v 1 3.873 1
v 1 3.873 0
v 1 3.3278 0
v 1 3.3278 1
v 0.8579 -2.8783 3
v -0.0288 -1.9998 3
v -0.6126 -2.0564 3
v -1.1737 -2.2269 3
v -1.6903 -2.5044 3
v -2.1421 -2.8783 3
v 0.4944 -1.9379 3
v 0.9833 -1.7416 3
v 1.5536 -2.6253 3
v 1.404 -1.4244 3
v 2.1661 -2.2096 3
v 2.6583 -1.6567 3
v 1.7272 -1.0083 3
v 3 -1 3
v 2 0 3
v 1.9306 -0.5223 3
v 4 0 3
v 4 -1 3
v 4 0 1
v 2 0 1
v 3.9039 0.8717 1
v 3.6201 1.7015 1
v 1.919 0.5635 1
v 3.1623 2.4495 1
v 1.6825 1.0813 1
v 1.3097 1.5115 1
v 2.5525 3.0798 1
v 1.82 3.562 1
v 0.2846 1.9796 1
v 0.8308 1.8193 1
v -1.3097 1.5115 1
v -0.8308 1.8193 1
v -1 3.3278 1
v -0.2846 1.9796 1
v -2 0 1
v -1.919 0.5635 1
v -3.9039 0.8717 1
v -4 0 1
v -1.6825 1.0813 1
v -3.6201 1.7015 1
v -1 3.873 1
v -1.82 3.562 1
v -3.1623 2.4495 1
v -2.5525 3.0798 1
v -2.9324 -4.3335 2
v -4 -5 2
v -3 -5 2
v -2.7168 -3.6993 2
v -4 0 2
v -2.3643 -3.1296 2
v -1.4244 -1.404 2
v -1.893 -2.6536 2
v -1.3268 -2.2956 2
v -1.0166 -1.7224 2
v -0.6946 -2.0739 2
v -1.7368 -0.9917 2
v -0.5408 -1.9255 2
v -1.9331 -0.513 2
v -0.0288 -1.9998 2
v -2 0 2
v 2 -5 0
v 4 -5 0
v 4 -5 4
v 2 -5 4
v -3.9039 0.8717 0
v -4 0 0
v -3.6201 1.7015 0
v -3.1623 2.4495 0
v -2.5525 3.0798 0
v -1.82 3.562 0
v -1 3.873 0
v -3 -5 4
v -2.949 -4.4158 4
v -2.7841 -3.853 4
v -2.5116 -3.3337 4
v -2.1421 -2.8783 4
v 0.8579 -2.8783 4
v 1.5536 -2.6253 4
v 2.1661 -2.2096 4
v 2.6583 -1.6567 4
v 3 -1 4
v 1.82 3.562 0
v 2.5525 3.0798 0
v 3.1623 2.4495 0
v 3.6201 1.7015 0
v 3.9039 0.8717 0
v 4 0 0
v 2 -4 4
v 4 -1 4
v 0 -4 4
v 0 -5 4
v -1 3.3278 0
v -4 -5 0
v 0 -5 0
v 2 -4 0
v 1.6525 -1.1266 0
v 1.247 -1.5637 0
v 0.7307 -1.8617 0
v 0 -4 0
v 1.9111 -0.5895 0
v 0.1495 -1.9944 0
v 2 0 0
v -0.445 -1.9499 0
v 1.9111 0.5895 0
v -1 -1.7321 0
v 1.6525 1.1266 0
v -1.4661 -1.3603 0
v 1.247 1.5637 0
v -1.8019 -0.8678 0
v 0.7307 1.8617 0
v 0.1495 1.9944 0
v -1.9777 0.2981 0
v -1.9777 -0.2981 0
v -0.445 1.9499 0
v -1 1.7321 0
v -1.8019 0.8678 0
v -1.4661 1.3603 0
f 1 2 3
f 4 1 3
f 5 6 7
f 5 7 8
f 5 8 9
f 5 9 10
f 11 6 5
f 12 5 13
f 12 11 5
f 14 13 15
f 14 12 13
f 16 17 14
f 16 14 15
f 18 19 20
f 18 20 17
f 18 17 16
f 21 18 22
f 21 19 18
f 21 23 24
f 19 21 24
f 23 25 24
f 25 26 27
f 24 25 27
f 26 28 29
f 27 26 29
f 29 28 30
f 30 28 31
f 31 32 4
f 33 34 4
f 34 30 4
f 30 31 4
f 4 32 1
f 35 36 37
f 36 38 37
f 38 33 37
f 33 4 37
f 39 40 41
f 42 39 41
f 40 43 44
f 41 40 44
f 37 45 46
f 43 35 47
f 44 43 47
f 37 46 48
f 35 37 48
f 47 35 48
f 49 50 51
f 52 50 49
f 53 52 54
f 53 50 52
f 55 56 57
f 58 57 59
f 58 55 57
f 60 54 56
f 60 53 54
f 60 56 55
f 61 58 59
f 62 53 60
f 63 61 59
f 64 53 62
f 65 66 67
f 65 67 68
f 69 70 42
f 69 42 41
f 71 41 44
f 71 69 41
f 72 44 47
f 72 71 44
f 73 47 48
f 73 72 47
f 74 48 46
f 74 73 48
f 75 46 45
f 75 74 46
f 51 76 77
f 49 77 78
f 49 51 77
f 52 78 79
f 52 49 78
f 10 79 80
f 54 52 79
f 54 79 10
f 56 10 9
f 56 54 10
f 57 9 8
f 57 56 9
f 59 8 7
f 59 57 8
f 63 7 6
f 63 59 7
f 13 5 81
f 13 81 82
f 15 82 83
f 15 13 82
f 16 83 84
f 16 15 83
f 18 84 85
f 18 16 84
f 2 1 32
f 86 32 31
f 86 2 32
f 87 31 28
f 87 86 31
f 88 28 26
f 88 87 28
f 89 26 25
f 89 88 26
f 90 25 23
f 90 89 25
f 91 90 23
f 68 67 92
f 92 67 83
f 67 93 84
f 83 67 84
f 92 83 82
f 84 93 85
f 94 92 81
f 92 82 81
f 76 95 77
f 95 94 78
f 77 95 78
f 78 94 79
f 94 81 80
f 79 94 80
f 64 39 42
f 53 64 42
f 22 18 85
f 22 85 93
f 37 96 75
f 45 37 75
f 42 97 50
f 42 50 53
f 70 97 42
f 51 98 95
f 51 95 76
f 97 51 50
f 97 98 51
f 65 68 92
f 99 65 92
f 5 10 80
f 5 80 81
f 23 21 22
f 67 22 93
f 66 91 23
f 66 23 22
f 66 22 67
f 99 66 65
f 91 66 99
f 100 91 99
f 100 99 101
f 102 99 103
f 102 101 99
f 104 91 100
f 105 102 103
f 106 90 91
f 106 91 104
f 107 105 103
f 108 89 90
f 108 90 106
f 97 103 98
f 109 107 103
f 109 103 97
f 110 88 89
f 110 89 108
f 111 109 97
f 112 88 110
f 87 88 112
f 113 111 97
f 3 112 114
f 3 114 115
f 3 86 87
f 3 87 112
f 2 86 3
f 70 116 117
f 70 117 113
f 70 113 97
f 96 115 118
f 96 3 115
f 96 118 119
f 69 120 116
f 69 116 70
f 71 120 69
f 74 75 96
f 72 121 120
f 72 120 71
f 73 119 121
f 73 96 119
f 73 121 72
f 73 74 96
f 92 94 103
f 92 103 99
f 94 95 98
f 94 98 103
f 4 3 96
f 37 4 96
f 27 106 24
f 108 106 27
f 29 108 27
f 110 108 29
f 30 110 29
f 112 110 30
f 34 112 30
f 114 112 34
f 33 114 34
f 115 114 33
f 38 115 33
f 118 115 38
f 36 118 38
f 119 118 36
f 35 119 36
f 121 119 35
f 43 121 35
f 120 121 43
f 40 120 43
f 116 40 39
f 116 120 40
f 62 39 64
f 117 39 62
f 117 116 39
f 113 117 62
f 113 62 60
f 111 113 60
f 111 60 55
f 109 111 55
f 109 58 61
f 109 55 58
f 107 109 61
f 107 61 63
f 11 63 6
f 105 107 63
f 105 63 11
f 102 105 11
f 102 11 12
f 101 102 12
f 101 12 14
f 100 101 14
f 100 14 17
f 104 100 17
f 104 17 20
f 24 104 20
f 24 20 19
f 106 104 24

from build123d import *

# Parameters (mm, degrees)
SKETCH1_R           = 2
BOSS_EXTRUDE1_DEPTH = 4
SKETCH2_W           = 2
SKETCH2_H           = 1
CUT_EXTRUDE1_DEPTH  = 4
CUT_EXTRUDE2_START  = -4
CUT_EXTRUDE2_DEPTH  = 4
CUT_EXTRUDE3_START  = -3
CUT_EXTRUDE3_DEPTH  = 3
CUT_EXTRUDE4_START  = -2
CUT_EXTRUDE4_DEPTH  = 2
CUT_EXTRUDE5_START  = -1
CUT_EXTRUDE5_DEPTH  = 1


# Read off the part's stored shape, not the designer's step: Cut-Extrude4
with BuildPart() as part:
    # Sketch1 → Boss-Extrude1 (new body)
    with BuildSketch(Plane.XY):
        with BuildLine():
            Line((4, -5), (-4, -5))
            Line((-4, -5), (-4, 0))
            ThreePointArc((-4, 0), (0, 4), (4, 0))
            Line((4, 0), (4, -5))
        make_face()
        Circle(SKETCH1_R, mode=Mode.SUBTRACT)
    extrude(amount=BOSS_EXTRUDE1_DEPTH)

    # Sketch2 → Cut-Extrude1 (cut)
    with BuildSketch(Plane.XY.offset(4)):
        with Locations((1, -4.5)):
            Rectangle(SKETCH2_W, SKETCH2_H)
    extrude(amount=-CUT_EXTRUDE1_DEPTH, mode=Mode.SUBTRACT)

    # Sketch3 → Cut-Extrude2 (cut)
    with BuildSketch(Plane.XY.offset(4).offset(CUT_EXTRUDE2_START)):
        with BuildLine():
            Line((1, 3.327826432), (-1, 3.327826432))
            Line((-1, 3.327826432), (-1, 3.872983346))
            ThreePointArc((-1, 3.872983346), (0, 4), (1, 3.872983346))
            Line((1, 3.872983346), (1, 3.327826432))
        make_face()
    extrude(amount=CUT_EXTRUDE2_DEPTH, mode=Mode.SUBTRACT)

    # Sketch5 → Cut-Extrude3 (cut)
    with BuildSketch(Plane.XY.offset(4).offset(CUT_EXTRUDE3_START)):
        with BuildLine():
            Line((4, 0), (-4, 0))
            ThreePointArc((-4, 0), (0, 4), (4, 0))
        make_face()
    extrude(amount=CUT_EXTRUDE3_DEPTH, mode=Mode.SUBTRACT)

    # Cut-Extrude4 outline → Cut-Extrude4 (cut)
    with BuildSketch(Plane.XY.offset(4).offset(CUT_EXTRUDE4_START)):
        with BuildLine():
            ThreePointArc((-3, -5), (-2.142135206, -2.878264494), (-0.028848782, -1.999791926))
            ThreePointArc((-0.028848782, -1.999791926), (-1.424376629, -1.403976929), (-2, 0))
            Line((-2, 0), (-4, 0))
            Line((-4, 0), (-4, -5))
            Line((-4, -5), (-3, -5))
        make_face()
    extrude(amount=CUT_EXTRUDE4_DEPTH, mode=Mode.SUBTRACT)

    # Sketch7 → Cut-Extrude5 (cut)
    with BuildSketch(Plane.XY.offset(4).offset(CUT_EXTRUDE5_START)):
        with BuildLine():
            Line((3, -1), (4, -1))
            Line((4, -1), (4, 0))
            Line((4, 0), (2, 0))
            ThreePointArc((2, 0), (1.403976929, -1.424376629), (-0.028848782, -1.999791926))
            ThreePointArc((-0.028848782, -1.999791926), (-1.173685148, -2.226867466), (-2.142135206, -2.878264494))
            Line((-2.142135206, -2.878264494), (0.857864794, -2.878264494))
            ThreePointArc((0.857864794, -2.878264494), (2.166117347, -2.209638468), (3, -1))
        make_face()
    extrude(amount=CUT_EXTRUDE5_DEPTH, mode=Mode.SUBTRACT)


solid = part.part
